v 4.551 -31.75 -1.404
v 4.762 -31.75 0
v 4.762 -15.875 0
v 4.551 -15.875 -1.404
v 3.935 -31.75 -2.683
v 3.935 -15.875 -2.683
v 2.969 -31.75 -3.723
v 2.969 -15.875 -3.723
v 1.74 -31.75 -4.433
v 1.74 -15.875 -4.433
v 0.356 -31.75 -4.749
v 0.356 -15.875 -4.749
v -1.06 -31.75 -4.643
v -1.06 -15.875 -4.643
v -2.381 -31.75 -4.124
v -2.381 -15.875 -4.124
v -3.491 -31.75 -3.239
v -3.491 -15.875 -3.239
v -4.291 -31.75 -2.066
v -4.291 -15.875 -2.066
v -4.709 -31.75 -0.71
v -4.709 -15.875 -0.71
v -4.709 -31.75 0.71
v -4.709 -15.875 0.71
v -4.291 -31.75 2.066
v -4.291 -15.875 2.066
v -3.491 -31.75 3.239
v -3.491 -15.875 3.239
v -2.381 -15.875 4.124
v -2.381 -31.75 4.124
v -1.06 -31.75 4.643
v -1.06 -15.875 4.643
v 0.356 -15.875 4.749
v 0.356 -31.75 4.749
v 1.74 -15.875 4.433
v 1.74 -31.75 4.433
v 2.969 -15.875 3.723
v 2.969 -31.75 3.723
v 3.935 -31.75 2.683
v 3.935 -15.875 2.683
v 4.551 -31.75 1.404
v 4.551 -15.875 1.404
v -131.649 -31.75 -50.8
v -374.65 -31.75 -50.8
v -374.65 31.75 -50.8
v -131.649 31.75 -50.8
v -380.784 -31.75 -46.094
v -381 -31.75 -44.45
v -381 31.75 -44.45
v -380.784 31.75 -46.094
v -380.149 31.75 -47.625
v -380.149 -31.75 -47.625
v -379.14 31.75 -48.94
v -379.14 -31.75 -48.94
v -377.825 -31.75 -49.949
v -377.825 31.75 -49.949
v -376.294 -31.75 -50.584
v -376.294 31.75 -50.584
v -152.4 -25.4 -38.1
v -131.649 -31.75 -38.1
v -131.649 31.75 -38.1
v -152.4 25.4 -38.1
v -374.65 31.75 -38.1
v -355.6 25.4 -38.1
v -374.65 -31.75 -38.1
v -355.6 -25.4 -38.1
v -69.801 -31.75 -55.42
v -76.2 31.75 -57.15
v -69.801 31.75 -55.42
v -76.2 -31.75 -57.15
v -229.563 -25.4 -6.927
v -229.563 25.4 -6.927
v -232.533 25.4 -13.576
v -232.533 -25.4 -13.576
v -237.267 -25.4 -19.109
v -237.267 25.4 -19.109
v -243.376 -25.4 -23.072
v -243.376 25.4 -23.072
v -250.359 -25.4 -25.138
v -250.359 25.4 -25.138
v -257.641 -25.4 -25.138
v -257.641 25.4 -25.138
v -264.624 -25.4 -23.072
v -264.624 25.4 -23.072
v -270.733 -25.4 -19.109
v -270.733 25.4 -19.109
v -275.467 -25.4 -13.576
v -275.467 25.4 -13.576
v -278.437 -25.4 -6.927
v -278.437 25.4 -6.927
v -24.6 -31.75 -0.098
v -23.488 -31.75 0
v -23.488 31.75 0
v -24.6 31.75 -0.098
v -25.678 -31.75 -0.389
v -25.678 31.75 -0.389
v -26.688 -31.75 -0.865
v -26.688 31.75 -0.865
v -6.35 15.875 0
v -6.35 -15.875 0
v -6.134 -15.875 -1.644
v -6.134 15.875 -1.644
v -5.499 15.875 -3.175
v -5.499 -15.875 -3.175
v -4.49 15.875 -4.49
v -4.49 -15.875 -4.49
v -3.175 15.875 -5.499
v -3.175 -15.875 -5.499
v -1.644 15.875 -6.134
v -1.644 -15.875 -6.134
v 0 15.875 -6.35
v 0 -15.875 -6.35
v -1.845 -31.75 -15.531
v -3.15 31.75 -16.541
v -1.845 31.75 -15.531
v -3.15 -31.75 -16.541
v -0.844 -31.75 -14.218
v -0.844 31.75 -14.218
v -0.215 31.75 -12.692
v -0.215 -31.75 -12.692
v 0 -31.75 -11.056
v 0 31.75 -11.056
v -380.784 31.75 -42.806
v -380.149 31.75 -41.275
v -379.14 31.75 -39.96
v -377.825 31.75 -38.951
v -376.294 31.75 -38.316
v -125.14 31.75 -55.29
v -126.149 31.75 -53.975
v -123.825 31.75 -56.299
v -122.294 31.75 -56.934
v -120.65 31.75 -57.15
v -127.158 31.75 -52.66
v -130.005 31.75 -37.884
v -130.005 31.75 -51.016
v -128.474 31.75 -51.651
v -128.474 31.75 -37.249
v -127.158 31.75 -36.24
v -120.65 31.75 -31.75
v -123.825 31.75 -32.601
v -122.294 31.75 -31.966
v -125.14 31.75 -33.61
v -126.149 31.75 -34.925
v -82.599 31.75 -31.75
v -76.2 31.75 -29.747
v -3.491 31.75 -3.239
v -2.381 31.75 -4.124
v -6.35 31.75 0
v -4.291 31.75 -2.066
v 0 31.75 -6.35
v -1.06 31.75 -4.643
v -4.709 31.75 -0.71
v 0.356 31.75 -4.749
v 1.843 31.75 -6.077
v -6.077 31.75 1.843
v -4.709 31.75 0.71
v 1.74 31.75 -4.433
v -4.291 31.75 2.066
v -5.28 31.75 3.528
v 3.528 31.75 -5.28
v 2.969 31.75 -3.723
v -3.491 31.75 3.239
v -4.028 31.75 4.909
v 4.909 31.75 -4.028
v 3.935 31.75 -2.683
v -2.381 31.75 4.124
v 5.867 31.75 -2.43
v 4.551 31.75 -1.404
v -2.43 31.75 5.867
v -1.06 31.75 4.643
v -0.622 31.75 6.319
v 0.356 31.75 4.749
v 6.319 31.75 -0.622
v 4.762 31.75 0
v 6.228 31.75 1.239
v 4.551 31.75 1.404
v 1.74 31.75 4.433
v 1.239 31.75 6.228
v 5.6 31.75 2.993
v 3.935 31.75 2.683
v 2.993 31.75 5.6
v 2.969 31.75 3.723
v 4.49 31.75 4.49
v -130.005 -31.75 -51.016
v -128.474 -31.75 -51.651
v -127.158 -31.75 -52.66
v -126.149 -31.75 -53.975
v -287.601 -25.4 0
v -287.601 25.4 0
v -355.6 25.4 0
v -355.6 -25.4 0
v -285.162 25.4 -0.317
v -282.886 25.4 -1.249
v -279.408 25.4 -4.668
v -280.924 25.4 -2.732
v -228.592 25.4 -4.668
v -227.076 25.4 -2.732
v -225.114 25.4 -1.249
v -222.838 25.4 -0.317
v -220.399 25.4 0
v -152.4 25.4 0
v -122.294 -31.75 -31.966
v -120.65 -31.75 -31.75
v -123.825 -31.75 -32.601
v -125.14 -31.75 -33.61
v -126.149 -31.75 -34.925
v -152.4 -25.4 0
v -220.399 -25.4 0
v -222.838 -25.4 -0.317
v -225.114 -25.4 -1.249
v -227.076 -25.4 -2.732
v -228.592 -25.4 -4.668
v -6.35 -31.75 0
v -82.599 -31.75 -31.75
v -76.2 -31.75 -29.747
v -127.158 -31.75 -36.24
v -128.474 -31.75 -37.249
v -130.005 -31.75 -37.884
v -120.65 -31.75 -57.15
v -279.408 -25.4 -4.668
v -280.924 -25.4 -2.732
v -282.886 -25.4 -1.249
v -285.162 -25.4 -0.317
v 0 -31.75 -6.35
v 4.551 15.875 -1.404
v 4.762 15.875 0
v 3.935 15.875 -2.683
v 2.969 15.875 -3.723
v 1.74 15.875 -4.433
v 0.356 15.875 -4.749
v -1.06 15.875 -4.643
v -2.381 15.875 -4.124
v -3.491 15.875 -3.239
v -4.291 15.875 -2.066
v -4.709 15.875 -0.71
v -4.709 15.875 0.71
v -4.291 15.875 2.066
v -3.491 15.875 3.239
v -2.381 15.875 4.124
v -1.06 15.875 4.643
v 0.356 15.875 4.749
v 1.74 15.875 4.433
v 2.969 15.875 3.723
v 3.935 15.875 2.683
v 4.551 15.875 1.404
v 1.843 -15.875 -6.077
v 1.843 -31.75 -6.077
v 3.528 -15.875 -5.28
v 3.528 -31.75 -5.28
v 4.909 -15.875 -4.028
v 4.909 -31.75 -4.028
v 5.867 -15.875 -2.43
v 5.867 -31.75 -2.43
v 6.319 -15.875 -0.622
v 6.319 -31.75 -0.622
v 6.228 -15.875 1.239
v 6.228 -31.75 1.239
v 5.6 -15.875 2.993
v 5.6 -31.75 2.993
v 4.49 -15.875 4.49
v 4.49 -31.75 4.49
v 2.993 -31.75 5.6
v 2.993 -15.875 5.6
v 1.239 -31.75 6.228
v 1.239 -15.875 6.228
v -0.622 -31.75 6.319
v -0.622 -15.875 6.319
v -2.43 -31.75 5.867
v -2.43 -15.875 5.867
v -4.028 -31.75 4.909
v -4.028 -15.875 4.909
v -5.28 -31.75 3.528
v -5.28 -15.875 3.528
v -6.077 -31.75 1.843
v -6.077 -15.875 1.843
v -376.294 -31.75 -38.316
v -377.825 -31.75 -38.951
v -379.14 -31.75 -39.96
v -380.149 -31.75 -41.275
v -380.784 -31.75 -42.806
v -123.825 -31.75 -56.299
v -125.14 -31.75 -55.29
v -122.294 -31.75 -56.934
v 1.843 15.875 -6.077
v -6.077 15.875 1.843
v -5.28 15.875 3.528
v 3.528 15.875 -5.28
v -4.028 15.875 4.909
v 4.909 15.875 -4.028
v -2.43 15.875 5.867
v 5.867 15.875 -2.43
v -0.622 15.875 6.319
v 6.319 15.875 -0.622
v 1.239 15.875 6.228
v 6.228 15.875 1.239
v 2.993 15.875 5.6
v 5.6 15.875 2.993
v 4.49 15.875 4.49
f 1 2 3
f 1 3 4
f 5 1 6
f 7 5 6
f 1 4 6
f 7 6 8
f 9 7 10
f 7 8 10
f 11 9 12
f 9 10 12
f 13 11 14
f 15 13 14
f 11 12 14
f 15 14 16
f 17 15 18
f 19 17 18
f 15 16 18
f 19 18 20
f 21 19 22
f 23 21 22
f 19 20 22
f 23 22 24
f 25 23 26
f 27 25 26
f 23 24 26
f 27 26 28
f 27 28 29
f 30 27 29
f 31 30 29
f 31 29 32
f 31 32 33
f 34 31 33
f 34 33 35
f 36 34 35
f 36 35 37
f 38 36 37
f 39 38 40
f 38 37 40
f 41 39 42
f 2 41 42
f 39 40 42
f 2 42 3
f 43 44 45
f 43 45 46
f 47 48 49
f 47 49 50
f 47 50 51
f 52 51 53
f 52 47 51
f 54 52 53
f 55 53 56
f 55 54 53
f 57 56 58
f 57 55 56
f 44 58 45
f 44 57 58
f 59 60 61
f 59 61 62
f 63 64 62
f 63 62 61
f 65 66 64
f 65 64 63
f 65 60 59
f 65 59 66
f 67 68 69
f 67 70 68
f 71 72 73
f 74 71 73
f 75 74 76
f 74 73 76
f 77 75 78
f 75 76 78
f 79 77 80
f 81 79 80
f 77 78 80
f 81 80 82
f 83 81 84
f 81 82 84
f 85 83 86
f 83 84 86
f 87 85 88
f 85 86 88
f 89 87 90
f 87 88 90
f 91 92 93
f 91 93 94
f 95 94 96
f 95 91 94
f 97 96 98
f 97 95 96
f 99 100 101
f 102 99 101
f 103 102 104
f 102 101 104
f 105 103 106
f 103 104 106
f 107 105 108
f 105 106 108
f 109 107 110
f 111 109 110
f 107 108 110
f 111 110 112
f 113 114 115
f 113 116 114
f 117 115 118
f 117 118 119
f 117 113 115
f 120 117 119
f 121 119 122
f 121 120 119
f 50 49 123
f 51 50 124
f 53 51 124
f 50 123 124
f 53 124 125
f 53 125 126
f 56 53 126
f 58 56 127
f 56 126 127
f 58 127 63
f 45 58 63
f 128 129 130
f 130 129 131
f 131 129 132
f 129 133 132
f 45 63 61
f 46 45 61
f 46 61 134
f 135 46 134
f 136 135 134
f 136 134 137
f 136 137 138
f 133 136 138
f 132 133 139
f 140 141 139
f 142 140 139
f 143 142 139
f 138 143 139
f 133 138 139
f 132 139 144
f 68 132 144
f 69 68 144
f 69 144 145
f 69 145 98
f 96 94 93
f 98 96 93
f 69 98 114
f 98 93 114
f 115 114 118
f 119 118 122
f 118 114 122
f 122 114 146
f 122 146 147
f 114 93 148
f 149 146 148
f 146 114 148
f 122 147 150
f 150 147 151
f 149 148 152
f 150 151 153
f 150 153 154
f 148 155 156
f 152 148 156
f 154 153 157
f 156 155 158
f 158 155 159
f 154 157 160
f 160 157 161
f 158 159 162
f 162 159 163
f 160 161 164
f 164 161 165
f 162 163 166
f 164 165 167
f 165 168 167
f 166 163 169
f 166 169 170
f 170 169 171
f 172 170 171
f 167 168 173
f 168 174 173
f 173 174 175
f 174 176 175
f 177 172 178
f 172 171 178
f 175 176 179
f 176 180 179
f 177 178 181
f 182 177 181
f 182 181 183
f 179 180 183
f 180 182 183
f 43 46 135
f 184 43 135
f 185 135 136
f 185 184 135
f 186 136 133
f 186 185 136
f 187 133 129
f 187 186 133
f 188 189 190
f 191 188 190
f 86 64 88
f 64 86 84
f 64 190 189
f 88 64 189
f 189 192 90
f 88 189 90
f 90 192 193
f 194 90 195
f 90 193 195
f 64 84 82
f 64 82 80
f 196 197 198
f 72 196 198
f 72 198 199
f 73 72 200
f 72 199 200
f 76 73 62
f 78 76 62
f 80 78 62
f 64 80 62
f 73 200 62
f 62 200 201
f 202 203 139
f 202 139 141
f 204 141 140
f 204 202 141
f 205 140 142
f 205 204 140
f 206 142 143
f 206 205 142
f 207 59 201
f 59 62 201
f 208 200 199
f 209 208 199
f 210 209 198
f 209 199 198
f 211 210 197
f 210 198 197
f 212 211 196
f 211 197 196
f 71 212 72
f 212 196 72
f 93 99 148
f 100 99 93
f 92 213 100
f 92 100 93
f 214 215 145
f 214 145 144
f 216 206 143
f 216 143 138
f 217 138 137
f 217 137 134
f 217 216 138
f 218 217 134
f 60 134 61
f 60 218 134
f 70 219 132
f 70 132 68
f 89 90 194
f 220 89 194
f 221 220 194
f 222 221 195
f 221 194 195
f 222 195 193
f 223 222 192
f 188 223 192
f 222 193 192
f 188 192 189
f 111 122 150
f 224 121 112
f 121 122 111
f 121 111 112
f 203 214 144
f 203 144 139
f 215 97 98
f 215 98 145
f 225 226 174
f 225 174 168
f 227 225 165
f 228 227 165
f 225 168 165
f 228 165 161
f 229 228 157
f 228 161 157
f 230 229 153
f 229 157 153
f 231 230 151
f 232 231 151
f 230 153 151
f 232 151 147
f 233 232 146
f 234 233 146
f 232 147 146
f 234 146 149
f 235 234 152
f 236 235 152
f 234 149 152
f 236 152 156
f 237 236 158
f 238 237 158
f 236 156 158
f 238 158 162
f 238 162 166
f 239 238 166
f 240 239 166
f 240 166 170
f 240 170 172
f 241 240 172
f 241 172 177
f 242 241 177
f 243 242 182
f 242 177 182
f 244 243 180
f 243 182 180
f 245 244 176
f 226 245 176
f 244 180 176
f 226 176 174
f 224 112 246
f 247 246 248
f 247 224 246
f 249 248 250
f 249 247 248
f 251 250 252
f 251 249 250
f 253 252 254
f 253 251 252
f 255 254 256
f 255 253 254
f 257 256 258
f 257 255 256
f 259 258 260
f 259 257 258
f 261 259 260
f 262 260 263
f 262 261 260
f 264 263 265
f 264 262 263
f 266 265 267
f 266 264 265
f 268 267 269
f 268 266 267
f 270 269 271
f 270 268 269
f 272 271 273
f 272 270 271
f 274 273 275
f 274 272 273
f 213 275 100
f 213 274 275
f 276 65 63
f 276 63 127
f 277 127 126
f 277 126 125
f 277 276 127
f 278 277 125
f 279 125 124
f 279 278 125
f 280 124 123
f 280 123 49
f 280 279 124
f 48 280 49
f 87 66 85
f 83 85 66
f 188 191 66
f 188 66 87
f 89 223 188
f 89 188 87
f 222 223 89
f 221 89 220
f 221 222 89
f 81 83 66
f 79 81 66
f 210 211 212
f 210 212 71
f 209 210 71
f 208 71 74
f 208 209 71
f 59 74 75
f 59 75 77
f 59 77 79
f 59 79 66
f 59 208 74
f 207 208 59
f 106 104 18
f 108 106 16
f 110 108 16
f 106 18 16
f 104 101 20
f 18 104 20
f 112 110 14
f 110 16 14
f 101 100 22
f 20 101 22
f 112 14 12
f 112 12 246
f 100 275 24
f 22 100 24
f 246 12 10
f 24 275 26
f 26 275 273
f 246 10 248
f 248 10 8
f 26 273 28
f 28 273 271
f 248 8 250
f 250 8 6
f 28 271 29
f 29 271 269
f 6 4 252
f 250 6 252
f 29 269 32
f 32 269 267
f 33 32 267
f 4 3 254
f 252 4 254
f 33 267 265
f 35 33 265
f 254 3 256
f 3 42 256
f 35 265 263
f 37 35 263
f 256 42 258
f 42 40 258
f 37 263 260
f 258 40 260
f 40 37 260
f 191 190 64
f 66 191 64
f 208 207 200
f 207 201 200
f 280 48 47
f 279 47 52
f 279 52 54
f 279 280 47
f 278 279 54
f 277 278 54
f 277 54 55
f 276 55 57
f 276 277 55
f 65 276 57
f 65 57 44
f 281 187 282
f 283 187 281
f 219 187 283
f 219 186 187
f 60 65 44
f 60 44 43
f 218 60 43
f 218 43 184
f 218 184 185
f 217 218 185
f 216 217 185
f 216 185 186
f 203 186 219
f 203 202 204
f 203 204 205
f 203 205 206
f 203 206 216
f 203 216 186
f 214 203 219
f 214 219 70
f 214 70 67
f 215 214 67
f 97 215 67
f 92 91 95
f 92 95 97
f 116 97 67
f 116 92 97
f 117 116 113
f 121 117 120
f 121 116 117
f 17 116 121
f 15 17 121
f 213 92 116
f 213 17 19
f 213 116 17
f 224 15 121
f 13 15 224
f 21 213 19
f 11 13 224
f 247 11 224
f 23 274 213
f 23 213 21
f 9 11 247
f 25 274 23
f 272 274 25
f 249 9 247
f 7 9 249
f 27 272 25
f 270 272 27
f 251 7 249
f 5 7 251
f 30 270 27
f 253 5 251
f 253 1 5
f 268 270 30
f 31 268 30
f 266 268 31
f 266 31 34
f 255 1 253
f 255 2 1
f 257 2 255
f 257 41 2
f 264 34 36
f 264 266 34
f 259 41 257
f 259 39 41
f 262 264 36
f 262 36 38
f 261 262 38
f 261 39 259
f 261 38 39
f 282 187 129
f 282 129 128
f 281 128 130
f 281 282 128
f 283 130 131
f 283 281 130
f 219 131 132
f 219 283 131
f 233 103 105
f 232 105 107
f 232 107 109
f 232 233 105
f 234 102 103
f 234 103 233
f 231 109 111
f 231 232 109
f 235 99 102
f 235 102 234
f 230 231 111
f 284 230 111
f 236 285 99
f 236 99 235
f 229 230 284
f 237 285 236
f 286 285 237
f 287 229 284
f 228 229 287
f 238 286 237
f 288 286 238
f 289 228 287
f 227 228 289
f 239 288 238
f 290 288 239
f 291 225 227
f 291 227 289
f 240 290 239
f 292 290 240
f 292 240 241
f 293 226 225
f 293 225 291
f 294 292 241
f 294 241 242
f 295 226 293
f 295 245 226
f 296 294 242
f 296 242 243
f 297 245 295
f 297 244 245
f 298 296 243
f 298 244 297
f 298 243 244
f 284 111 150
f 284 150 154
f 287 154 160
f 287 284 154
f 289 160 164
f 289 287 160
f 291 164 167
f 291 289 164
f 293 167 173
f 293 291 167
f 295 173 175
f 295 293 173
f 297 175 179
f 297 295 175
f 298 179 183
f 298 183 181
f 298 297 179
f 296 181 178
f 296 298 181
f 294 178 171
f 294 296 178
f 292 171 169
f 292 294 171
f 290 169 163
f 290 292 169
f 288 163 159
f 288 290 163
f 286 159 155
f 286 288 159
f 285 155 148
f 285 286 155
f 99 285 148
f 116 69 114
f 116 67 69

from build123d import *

# Parameters (mm, degrees)
F1_DEPTH      = 31.75
F1_DEPTH_BACK = 31.75
F2_DEPTH      = 25.4
F2_DEPTH_BACK = 25.4
F4_R          = 6.35
F5_DEPTH      = 31.75


with BuildPart() as f1:
    # F0 (on Front) → F1 (new body, two sides)
    with BuildSketch(Plane.XZ) as f1_sk:
        with BuildLine():
            Line((0, -11.0555849444), (0, -6.35))
            ThreePointArc((0, -6.35), (4.4901280605, 4.4901280605), (-6.35, 0))
            Line((-6.35, 0), (-23.488145619, 0))
            ThreePointArc((-23.488145619, 0), (-25.145368487, -0.2200642446), (-26.6877266311, -0.8650039793))
            Line((-26.6877266311, -0.8650039793), (-76.2, -29.7471634445))
            Line((-76.2, -29.7471634445), (-82.5991620242, -31.75))
            Line((-82.5991620242, -31.75), (-120.65, -31.75))
            ThreePointArc((-120.65, -31.75), (-123.825, -32.600738686), (-126.149261314, -34.925))
            ThreePointArc((-126.149261314, -34.925), (-128.4735226281, -37.249261314), (-131.6485226281, -38.1))
            Line((-131.6485226281, -38.1), (-152.4, -38.1))
            Line((-152.4, -38.1), (-355.6, -38.1))
            Line((-355.6, -38.1), (-374.65, -38.1))
            ThreePointArc((-374.65, -38.1), (-379.1401280605, -39.9598719395), (-381, -44.45))
            ThreePointArc((-381, -44.45), (-379.1401280605, -48.9401280605), (-374.65, -50.8))
            Line((-374.65, -50.8), (-131.6485226281, -50.8))
            ThreePointArc((-131.6485226281, -50.8), (-128.4735226281, -51.650738686), (-126.149261314, -53.975))
            ThreePointArc((-126.149261314, -53.975), (-123.825, -56.299261314), (-120.65, -57.15))
            Line((-120.65, -57.15), (-76.2, -57.15))
            Line((-76.2, -57.15), (-69.8008379758, -55.4199920414))
            Line((-69.8008379758, -55.4199920414), (-3.1504189879, -16.5405809651))
            ThreePointArc((-3.1504189879, -16.5405809651), (-0.8436473312, -14.2182705574), (0, -11.0555849444))
        make_face()
        with BuildLine():
            ThreePointArc((-4.7625, 0), (0, 4.7625), (4.7625, 0))
            ThreePointArc((4.7625, 0), (0, -4.7625), (-4.7625, 0))
        make_face(mode=Mode.SUBTRACT)
    extrude(amount=F1_DEPTH)
    extrude(f1_sk.sketch, amount=-F1_DEPTH_BACK)

    # F0 (on Front) → F2 (join, two sides)
    with BuildSketch(Plane.XZ) as f2_sk:
        with BuildLine():
            Line((0, -11.0555849444), (0, -6.35))
            ThreePointArc((0, -6.35), (4.4901280605, 4.4901280605), (-6.35, 0))
            Line((-6.35, 0), (-23.488145619, 0))
            ThreePointArc((-23.488145619, 0), (-25.145368487, -0.2200642446), (-26.6877266311, -0.8650039793))
            Line((-26.6877266311, -0.8650039793), (-76.2, -29.7471634445))
            Line((-76.2, -29.7471634445), (-82.5991620242, -31.75))
            Line((-82.5991620242, -31.75), (-120.65, -31.75))
            ThreePointArc((-120.65, -31.75), (-123.825, -32.600738686), (-126.149261314, -34.925))
            ThreePointArc((-126.149261314, -34.925), (-128.4735226281, -37.249261314), (-131.6485226281, -38.1))
            Line((-131.6485226281, -38.1), (-152.4, -38.1))
            Line((-152.4, -38.1), (-355.6, -38.1))
            Line((-355.6, -38.1), (-374.65, -38.1))
            ThreePointArc((-374.65, -38.1), (-379.1401280605, -39.9598719395), (-381, -44.45))
            ThreePointArc((-381, -44.45), (-379.1401280605, -48.9401280605), (-374.65, -50.8))
            Line((-374.65, -50.8), (-131.6485226281, -50.8))
            ThreePointArc((-131.6485226281, -50.8), (-128.4735226281, -51.650738686), (-126.149261314, -53.975))
            ThreePointArc((-126.149261314, -53.975), (-123.825, -56.299261314), (-120.65, -57.15))
            Line((-120.65, -57.15), (-76.2, -57.15))
            Line((-76.2, -57.15), (-69.8008379758, -55.4199920414))
            Line((-69.8008379758, -55.4199920414), (-3.1504189879, -16.5405809651))
            ThreePointArc((-3.1504189879, -16.5405809651), (-0.8436473312, -14.2182705574), (0, -11.0555849444))
        make_face()
        with BuildLine():
            ThreePointArc((-4.7625, 0), (0, 4.7625), (4.7625, 0))
            ThreePointArc((4.7625, 0), (0, -4.7625), (-4.7625, 0))
        make_face(mode=Mode.SUBTRACT)
        with BuildLine():
            Line((-355.6, -38.1), (-152.4, -38.1))
            Line((-152.4, -38.1), (-152.4, 0))
            Line((-152.4, 0), (-220.3989583495, 0))
            ThreePointArc((-220.3989583495, 0), (-226.1427494637, -1.9266785646), (-229.5628787996, -6.9272727273))
            ThreePointArc((-229.5628787996, -6.9272727273), (-254, -25.4), (-278.4371212004, -6.9272727273))
            ThreePointArc((-278.4371212004, -6.9272727273), (-281.8572505363, -1.9266785646), (-287.6010416505, 0))
            Line((-287.6010416505, 0), (-355.6, 0))
            Line((-355.6, 0), (-355.6, -38.1))
        make_face()
    extrude(amount=F2_DEPTH)
    extrude(f2_sk.sketch, amount=-F2_DEPTH_BACK)

    # F4 (on offset) → F5 (cut)
    with BuildSketch(Plane.XZ.offset(15.875)):
        Circle(F4_R)
    extrude(amount=-F5_DEPTH, mode=Mode.SUBTRACT)


solid = f1.part
